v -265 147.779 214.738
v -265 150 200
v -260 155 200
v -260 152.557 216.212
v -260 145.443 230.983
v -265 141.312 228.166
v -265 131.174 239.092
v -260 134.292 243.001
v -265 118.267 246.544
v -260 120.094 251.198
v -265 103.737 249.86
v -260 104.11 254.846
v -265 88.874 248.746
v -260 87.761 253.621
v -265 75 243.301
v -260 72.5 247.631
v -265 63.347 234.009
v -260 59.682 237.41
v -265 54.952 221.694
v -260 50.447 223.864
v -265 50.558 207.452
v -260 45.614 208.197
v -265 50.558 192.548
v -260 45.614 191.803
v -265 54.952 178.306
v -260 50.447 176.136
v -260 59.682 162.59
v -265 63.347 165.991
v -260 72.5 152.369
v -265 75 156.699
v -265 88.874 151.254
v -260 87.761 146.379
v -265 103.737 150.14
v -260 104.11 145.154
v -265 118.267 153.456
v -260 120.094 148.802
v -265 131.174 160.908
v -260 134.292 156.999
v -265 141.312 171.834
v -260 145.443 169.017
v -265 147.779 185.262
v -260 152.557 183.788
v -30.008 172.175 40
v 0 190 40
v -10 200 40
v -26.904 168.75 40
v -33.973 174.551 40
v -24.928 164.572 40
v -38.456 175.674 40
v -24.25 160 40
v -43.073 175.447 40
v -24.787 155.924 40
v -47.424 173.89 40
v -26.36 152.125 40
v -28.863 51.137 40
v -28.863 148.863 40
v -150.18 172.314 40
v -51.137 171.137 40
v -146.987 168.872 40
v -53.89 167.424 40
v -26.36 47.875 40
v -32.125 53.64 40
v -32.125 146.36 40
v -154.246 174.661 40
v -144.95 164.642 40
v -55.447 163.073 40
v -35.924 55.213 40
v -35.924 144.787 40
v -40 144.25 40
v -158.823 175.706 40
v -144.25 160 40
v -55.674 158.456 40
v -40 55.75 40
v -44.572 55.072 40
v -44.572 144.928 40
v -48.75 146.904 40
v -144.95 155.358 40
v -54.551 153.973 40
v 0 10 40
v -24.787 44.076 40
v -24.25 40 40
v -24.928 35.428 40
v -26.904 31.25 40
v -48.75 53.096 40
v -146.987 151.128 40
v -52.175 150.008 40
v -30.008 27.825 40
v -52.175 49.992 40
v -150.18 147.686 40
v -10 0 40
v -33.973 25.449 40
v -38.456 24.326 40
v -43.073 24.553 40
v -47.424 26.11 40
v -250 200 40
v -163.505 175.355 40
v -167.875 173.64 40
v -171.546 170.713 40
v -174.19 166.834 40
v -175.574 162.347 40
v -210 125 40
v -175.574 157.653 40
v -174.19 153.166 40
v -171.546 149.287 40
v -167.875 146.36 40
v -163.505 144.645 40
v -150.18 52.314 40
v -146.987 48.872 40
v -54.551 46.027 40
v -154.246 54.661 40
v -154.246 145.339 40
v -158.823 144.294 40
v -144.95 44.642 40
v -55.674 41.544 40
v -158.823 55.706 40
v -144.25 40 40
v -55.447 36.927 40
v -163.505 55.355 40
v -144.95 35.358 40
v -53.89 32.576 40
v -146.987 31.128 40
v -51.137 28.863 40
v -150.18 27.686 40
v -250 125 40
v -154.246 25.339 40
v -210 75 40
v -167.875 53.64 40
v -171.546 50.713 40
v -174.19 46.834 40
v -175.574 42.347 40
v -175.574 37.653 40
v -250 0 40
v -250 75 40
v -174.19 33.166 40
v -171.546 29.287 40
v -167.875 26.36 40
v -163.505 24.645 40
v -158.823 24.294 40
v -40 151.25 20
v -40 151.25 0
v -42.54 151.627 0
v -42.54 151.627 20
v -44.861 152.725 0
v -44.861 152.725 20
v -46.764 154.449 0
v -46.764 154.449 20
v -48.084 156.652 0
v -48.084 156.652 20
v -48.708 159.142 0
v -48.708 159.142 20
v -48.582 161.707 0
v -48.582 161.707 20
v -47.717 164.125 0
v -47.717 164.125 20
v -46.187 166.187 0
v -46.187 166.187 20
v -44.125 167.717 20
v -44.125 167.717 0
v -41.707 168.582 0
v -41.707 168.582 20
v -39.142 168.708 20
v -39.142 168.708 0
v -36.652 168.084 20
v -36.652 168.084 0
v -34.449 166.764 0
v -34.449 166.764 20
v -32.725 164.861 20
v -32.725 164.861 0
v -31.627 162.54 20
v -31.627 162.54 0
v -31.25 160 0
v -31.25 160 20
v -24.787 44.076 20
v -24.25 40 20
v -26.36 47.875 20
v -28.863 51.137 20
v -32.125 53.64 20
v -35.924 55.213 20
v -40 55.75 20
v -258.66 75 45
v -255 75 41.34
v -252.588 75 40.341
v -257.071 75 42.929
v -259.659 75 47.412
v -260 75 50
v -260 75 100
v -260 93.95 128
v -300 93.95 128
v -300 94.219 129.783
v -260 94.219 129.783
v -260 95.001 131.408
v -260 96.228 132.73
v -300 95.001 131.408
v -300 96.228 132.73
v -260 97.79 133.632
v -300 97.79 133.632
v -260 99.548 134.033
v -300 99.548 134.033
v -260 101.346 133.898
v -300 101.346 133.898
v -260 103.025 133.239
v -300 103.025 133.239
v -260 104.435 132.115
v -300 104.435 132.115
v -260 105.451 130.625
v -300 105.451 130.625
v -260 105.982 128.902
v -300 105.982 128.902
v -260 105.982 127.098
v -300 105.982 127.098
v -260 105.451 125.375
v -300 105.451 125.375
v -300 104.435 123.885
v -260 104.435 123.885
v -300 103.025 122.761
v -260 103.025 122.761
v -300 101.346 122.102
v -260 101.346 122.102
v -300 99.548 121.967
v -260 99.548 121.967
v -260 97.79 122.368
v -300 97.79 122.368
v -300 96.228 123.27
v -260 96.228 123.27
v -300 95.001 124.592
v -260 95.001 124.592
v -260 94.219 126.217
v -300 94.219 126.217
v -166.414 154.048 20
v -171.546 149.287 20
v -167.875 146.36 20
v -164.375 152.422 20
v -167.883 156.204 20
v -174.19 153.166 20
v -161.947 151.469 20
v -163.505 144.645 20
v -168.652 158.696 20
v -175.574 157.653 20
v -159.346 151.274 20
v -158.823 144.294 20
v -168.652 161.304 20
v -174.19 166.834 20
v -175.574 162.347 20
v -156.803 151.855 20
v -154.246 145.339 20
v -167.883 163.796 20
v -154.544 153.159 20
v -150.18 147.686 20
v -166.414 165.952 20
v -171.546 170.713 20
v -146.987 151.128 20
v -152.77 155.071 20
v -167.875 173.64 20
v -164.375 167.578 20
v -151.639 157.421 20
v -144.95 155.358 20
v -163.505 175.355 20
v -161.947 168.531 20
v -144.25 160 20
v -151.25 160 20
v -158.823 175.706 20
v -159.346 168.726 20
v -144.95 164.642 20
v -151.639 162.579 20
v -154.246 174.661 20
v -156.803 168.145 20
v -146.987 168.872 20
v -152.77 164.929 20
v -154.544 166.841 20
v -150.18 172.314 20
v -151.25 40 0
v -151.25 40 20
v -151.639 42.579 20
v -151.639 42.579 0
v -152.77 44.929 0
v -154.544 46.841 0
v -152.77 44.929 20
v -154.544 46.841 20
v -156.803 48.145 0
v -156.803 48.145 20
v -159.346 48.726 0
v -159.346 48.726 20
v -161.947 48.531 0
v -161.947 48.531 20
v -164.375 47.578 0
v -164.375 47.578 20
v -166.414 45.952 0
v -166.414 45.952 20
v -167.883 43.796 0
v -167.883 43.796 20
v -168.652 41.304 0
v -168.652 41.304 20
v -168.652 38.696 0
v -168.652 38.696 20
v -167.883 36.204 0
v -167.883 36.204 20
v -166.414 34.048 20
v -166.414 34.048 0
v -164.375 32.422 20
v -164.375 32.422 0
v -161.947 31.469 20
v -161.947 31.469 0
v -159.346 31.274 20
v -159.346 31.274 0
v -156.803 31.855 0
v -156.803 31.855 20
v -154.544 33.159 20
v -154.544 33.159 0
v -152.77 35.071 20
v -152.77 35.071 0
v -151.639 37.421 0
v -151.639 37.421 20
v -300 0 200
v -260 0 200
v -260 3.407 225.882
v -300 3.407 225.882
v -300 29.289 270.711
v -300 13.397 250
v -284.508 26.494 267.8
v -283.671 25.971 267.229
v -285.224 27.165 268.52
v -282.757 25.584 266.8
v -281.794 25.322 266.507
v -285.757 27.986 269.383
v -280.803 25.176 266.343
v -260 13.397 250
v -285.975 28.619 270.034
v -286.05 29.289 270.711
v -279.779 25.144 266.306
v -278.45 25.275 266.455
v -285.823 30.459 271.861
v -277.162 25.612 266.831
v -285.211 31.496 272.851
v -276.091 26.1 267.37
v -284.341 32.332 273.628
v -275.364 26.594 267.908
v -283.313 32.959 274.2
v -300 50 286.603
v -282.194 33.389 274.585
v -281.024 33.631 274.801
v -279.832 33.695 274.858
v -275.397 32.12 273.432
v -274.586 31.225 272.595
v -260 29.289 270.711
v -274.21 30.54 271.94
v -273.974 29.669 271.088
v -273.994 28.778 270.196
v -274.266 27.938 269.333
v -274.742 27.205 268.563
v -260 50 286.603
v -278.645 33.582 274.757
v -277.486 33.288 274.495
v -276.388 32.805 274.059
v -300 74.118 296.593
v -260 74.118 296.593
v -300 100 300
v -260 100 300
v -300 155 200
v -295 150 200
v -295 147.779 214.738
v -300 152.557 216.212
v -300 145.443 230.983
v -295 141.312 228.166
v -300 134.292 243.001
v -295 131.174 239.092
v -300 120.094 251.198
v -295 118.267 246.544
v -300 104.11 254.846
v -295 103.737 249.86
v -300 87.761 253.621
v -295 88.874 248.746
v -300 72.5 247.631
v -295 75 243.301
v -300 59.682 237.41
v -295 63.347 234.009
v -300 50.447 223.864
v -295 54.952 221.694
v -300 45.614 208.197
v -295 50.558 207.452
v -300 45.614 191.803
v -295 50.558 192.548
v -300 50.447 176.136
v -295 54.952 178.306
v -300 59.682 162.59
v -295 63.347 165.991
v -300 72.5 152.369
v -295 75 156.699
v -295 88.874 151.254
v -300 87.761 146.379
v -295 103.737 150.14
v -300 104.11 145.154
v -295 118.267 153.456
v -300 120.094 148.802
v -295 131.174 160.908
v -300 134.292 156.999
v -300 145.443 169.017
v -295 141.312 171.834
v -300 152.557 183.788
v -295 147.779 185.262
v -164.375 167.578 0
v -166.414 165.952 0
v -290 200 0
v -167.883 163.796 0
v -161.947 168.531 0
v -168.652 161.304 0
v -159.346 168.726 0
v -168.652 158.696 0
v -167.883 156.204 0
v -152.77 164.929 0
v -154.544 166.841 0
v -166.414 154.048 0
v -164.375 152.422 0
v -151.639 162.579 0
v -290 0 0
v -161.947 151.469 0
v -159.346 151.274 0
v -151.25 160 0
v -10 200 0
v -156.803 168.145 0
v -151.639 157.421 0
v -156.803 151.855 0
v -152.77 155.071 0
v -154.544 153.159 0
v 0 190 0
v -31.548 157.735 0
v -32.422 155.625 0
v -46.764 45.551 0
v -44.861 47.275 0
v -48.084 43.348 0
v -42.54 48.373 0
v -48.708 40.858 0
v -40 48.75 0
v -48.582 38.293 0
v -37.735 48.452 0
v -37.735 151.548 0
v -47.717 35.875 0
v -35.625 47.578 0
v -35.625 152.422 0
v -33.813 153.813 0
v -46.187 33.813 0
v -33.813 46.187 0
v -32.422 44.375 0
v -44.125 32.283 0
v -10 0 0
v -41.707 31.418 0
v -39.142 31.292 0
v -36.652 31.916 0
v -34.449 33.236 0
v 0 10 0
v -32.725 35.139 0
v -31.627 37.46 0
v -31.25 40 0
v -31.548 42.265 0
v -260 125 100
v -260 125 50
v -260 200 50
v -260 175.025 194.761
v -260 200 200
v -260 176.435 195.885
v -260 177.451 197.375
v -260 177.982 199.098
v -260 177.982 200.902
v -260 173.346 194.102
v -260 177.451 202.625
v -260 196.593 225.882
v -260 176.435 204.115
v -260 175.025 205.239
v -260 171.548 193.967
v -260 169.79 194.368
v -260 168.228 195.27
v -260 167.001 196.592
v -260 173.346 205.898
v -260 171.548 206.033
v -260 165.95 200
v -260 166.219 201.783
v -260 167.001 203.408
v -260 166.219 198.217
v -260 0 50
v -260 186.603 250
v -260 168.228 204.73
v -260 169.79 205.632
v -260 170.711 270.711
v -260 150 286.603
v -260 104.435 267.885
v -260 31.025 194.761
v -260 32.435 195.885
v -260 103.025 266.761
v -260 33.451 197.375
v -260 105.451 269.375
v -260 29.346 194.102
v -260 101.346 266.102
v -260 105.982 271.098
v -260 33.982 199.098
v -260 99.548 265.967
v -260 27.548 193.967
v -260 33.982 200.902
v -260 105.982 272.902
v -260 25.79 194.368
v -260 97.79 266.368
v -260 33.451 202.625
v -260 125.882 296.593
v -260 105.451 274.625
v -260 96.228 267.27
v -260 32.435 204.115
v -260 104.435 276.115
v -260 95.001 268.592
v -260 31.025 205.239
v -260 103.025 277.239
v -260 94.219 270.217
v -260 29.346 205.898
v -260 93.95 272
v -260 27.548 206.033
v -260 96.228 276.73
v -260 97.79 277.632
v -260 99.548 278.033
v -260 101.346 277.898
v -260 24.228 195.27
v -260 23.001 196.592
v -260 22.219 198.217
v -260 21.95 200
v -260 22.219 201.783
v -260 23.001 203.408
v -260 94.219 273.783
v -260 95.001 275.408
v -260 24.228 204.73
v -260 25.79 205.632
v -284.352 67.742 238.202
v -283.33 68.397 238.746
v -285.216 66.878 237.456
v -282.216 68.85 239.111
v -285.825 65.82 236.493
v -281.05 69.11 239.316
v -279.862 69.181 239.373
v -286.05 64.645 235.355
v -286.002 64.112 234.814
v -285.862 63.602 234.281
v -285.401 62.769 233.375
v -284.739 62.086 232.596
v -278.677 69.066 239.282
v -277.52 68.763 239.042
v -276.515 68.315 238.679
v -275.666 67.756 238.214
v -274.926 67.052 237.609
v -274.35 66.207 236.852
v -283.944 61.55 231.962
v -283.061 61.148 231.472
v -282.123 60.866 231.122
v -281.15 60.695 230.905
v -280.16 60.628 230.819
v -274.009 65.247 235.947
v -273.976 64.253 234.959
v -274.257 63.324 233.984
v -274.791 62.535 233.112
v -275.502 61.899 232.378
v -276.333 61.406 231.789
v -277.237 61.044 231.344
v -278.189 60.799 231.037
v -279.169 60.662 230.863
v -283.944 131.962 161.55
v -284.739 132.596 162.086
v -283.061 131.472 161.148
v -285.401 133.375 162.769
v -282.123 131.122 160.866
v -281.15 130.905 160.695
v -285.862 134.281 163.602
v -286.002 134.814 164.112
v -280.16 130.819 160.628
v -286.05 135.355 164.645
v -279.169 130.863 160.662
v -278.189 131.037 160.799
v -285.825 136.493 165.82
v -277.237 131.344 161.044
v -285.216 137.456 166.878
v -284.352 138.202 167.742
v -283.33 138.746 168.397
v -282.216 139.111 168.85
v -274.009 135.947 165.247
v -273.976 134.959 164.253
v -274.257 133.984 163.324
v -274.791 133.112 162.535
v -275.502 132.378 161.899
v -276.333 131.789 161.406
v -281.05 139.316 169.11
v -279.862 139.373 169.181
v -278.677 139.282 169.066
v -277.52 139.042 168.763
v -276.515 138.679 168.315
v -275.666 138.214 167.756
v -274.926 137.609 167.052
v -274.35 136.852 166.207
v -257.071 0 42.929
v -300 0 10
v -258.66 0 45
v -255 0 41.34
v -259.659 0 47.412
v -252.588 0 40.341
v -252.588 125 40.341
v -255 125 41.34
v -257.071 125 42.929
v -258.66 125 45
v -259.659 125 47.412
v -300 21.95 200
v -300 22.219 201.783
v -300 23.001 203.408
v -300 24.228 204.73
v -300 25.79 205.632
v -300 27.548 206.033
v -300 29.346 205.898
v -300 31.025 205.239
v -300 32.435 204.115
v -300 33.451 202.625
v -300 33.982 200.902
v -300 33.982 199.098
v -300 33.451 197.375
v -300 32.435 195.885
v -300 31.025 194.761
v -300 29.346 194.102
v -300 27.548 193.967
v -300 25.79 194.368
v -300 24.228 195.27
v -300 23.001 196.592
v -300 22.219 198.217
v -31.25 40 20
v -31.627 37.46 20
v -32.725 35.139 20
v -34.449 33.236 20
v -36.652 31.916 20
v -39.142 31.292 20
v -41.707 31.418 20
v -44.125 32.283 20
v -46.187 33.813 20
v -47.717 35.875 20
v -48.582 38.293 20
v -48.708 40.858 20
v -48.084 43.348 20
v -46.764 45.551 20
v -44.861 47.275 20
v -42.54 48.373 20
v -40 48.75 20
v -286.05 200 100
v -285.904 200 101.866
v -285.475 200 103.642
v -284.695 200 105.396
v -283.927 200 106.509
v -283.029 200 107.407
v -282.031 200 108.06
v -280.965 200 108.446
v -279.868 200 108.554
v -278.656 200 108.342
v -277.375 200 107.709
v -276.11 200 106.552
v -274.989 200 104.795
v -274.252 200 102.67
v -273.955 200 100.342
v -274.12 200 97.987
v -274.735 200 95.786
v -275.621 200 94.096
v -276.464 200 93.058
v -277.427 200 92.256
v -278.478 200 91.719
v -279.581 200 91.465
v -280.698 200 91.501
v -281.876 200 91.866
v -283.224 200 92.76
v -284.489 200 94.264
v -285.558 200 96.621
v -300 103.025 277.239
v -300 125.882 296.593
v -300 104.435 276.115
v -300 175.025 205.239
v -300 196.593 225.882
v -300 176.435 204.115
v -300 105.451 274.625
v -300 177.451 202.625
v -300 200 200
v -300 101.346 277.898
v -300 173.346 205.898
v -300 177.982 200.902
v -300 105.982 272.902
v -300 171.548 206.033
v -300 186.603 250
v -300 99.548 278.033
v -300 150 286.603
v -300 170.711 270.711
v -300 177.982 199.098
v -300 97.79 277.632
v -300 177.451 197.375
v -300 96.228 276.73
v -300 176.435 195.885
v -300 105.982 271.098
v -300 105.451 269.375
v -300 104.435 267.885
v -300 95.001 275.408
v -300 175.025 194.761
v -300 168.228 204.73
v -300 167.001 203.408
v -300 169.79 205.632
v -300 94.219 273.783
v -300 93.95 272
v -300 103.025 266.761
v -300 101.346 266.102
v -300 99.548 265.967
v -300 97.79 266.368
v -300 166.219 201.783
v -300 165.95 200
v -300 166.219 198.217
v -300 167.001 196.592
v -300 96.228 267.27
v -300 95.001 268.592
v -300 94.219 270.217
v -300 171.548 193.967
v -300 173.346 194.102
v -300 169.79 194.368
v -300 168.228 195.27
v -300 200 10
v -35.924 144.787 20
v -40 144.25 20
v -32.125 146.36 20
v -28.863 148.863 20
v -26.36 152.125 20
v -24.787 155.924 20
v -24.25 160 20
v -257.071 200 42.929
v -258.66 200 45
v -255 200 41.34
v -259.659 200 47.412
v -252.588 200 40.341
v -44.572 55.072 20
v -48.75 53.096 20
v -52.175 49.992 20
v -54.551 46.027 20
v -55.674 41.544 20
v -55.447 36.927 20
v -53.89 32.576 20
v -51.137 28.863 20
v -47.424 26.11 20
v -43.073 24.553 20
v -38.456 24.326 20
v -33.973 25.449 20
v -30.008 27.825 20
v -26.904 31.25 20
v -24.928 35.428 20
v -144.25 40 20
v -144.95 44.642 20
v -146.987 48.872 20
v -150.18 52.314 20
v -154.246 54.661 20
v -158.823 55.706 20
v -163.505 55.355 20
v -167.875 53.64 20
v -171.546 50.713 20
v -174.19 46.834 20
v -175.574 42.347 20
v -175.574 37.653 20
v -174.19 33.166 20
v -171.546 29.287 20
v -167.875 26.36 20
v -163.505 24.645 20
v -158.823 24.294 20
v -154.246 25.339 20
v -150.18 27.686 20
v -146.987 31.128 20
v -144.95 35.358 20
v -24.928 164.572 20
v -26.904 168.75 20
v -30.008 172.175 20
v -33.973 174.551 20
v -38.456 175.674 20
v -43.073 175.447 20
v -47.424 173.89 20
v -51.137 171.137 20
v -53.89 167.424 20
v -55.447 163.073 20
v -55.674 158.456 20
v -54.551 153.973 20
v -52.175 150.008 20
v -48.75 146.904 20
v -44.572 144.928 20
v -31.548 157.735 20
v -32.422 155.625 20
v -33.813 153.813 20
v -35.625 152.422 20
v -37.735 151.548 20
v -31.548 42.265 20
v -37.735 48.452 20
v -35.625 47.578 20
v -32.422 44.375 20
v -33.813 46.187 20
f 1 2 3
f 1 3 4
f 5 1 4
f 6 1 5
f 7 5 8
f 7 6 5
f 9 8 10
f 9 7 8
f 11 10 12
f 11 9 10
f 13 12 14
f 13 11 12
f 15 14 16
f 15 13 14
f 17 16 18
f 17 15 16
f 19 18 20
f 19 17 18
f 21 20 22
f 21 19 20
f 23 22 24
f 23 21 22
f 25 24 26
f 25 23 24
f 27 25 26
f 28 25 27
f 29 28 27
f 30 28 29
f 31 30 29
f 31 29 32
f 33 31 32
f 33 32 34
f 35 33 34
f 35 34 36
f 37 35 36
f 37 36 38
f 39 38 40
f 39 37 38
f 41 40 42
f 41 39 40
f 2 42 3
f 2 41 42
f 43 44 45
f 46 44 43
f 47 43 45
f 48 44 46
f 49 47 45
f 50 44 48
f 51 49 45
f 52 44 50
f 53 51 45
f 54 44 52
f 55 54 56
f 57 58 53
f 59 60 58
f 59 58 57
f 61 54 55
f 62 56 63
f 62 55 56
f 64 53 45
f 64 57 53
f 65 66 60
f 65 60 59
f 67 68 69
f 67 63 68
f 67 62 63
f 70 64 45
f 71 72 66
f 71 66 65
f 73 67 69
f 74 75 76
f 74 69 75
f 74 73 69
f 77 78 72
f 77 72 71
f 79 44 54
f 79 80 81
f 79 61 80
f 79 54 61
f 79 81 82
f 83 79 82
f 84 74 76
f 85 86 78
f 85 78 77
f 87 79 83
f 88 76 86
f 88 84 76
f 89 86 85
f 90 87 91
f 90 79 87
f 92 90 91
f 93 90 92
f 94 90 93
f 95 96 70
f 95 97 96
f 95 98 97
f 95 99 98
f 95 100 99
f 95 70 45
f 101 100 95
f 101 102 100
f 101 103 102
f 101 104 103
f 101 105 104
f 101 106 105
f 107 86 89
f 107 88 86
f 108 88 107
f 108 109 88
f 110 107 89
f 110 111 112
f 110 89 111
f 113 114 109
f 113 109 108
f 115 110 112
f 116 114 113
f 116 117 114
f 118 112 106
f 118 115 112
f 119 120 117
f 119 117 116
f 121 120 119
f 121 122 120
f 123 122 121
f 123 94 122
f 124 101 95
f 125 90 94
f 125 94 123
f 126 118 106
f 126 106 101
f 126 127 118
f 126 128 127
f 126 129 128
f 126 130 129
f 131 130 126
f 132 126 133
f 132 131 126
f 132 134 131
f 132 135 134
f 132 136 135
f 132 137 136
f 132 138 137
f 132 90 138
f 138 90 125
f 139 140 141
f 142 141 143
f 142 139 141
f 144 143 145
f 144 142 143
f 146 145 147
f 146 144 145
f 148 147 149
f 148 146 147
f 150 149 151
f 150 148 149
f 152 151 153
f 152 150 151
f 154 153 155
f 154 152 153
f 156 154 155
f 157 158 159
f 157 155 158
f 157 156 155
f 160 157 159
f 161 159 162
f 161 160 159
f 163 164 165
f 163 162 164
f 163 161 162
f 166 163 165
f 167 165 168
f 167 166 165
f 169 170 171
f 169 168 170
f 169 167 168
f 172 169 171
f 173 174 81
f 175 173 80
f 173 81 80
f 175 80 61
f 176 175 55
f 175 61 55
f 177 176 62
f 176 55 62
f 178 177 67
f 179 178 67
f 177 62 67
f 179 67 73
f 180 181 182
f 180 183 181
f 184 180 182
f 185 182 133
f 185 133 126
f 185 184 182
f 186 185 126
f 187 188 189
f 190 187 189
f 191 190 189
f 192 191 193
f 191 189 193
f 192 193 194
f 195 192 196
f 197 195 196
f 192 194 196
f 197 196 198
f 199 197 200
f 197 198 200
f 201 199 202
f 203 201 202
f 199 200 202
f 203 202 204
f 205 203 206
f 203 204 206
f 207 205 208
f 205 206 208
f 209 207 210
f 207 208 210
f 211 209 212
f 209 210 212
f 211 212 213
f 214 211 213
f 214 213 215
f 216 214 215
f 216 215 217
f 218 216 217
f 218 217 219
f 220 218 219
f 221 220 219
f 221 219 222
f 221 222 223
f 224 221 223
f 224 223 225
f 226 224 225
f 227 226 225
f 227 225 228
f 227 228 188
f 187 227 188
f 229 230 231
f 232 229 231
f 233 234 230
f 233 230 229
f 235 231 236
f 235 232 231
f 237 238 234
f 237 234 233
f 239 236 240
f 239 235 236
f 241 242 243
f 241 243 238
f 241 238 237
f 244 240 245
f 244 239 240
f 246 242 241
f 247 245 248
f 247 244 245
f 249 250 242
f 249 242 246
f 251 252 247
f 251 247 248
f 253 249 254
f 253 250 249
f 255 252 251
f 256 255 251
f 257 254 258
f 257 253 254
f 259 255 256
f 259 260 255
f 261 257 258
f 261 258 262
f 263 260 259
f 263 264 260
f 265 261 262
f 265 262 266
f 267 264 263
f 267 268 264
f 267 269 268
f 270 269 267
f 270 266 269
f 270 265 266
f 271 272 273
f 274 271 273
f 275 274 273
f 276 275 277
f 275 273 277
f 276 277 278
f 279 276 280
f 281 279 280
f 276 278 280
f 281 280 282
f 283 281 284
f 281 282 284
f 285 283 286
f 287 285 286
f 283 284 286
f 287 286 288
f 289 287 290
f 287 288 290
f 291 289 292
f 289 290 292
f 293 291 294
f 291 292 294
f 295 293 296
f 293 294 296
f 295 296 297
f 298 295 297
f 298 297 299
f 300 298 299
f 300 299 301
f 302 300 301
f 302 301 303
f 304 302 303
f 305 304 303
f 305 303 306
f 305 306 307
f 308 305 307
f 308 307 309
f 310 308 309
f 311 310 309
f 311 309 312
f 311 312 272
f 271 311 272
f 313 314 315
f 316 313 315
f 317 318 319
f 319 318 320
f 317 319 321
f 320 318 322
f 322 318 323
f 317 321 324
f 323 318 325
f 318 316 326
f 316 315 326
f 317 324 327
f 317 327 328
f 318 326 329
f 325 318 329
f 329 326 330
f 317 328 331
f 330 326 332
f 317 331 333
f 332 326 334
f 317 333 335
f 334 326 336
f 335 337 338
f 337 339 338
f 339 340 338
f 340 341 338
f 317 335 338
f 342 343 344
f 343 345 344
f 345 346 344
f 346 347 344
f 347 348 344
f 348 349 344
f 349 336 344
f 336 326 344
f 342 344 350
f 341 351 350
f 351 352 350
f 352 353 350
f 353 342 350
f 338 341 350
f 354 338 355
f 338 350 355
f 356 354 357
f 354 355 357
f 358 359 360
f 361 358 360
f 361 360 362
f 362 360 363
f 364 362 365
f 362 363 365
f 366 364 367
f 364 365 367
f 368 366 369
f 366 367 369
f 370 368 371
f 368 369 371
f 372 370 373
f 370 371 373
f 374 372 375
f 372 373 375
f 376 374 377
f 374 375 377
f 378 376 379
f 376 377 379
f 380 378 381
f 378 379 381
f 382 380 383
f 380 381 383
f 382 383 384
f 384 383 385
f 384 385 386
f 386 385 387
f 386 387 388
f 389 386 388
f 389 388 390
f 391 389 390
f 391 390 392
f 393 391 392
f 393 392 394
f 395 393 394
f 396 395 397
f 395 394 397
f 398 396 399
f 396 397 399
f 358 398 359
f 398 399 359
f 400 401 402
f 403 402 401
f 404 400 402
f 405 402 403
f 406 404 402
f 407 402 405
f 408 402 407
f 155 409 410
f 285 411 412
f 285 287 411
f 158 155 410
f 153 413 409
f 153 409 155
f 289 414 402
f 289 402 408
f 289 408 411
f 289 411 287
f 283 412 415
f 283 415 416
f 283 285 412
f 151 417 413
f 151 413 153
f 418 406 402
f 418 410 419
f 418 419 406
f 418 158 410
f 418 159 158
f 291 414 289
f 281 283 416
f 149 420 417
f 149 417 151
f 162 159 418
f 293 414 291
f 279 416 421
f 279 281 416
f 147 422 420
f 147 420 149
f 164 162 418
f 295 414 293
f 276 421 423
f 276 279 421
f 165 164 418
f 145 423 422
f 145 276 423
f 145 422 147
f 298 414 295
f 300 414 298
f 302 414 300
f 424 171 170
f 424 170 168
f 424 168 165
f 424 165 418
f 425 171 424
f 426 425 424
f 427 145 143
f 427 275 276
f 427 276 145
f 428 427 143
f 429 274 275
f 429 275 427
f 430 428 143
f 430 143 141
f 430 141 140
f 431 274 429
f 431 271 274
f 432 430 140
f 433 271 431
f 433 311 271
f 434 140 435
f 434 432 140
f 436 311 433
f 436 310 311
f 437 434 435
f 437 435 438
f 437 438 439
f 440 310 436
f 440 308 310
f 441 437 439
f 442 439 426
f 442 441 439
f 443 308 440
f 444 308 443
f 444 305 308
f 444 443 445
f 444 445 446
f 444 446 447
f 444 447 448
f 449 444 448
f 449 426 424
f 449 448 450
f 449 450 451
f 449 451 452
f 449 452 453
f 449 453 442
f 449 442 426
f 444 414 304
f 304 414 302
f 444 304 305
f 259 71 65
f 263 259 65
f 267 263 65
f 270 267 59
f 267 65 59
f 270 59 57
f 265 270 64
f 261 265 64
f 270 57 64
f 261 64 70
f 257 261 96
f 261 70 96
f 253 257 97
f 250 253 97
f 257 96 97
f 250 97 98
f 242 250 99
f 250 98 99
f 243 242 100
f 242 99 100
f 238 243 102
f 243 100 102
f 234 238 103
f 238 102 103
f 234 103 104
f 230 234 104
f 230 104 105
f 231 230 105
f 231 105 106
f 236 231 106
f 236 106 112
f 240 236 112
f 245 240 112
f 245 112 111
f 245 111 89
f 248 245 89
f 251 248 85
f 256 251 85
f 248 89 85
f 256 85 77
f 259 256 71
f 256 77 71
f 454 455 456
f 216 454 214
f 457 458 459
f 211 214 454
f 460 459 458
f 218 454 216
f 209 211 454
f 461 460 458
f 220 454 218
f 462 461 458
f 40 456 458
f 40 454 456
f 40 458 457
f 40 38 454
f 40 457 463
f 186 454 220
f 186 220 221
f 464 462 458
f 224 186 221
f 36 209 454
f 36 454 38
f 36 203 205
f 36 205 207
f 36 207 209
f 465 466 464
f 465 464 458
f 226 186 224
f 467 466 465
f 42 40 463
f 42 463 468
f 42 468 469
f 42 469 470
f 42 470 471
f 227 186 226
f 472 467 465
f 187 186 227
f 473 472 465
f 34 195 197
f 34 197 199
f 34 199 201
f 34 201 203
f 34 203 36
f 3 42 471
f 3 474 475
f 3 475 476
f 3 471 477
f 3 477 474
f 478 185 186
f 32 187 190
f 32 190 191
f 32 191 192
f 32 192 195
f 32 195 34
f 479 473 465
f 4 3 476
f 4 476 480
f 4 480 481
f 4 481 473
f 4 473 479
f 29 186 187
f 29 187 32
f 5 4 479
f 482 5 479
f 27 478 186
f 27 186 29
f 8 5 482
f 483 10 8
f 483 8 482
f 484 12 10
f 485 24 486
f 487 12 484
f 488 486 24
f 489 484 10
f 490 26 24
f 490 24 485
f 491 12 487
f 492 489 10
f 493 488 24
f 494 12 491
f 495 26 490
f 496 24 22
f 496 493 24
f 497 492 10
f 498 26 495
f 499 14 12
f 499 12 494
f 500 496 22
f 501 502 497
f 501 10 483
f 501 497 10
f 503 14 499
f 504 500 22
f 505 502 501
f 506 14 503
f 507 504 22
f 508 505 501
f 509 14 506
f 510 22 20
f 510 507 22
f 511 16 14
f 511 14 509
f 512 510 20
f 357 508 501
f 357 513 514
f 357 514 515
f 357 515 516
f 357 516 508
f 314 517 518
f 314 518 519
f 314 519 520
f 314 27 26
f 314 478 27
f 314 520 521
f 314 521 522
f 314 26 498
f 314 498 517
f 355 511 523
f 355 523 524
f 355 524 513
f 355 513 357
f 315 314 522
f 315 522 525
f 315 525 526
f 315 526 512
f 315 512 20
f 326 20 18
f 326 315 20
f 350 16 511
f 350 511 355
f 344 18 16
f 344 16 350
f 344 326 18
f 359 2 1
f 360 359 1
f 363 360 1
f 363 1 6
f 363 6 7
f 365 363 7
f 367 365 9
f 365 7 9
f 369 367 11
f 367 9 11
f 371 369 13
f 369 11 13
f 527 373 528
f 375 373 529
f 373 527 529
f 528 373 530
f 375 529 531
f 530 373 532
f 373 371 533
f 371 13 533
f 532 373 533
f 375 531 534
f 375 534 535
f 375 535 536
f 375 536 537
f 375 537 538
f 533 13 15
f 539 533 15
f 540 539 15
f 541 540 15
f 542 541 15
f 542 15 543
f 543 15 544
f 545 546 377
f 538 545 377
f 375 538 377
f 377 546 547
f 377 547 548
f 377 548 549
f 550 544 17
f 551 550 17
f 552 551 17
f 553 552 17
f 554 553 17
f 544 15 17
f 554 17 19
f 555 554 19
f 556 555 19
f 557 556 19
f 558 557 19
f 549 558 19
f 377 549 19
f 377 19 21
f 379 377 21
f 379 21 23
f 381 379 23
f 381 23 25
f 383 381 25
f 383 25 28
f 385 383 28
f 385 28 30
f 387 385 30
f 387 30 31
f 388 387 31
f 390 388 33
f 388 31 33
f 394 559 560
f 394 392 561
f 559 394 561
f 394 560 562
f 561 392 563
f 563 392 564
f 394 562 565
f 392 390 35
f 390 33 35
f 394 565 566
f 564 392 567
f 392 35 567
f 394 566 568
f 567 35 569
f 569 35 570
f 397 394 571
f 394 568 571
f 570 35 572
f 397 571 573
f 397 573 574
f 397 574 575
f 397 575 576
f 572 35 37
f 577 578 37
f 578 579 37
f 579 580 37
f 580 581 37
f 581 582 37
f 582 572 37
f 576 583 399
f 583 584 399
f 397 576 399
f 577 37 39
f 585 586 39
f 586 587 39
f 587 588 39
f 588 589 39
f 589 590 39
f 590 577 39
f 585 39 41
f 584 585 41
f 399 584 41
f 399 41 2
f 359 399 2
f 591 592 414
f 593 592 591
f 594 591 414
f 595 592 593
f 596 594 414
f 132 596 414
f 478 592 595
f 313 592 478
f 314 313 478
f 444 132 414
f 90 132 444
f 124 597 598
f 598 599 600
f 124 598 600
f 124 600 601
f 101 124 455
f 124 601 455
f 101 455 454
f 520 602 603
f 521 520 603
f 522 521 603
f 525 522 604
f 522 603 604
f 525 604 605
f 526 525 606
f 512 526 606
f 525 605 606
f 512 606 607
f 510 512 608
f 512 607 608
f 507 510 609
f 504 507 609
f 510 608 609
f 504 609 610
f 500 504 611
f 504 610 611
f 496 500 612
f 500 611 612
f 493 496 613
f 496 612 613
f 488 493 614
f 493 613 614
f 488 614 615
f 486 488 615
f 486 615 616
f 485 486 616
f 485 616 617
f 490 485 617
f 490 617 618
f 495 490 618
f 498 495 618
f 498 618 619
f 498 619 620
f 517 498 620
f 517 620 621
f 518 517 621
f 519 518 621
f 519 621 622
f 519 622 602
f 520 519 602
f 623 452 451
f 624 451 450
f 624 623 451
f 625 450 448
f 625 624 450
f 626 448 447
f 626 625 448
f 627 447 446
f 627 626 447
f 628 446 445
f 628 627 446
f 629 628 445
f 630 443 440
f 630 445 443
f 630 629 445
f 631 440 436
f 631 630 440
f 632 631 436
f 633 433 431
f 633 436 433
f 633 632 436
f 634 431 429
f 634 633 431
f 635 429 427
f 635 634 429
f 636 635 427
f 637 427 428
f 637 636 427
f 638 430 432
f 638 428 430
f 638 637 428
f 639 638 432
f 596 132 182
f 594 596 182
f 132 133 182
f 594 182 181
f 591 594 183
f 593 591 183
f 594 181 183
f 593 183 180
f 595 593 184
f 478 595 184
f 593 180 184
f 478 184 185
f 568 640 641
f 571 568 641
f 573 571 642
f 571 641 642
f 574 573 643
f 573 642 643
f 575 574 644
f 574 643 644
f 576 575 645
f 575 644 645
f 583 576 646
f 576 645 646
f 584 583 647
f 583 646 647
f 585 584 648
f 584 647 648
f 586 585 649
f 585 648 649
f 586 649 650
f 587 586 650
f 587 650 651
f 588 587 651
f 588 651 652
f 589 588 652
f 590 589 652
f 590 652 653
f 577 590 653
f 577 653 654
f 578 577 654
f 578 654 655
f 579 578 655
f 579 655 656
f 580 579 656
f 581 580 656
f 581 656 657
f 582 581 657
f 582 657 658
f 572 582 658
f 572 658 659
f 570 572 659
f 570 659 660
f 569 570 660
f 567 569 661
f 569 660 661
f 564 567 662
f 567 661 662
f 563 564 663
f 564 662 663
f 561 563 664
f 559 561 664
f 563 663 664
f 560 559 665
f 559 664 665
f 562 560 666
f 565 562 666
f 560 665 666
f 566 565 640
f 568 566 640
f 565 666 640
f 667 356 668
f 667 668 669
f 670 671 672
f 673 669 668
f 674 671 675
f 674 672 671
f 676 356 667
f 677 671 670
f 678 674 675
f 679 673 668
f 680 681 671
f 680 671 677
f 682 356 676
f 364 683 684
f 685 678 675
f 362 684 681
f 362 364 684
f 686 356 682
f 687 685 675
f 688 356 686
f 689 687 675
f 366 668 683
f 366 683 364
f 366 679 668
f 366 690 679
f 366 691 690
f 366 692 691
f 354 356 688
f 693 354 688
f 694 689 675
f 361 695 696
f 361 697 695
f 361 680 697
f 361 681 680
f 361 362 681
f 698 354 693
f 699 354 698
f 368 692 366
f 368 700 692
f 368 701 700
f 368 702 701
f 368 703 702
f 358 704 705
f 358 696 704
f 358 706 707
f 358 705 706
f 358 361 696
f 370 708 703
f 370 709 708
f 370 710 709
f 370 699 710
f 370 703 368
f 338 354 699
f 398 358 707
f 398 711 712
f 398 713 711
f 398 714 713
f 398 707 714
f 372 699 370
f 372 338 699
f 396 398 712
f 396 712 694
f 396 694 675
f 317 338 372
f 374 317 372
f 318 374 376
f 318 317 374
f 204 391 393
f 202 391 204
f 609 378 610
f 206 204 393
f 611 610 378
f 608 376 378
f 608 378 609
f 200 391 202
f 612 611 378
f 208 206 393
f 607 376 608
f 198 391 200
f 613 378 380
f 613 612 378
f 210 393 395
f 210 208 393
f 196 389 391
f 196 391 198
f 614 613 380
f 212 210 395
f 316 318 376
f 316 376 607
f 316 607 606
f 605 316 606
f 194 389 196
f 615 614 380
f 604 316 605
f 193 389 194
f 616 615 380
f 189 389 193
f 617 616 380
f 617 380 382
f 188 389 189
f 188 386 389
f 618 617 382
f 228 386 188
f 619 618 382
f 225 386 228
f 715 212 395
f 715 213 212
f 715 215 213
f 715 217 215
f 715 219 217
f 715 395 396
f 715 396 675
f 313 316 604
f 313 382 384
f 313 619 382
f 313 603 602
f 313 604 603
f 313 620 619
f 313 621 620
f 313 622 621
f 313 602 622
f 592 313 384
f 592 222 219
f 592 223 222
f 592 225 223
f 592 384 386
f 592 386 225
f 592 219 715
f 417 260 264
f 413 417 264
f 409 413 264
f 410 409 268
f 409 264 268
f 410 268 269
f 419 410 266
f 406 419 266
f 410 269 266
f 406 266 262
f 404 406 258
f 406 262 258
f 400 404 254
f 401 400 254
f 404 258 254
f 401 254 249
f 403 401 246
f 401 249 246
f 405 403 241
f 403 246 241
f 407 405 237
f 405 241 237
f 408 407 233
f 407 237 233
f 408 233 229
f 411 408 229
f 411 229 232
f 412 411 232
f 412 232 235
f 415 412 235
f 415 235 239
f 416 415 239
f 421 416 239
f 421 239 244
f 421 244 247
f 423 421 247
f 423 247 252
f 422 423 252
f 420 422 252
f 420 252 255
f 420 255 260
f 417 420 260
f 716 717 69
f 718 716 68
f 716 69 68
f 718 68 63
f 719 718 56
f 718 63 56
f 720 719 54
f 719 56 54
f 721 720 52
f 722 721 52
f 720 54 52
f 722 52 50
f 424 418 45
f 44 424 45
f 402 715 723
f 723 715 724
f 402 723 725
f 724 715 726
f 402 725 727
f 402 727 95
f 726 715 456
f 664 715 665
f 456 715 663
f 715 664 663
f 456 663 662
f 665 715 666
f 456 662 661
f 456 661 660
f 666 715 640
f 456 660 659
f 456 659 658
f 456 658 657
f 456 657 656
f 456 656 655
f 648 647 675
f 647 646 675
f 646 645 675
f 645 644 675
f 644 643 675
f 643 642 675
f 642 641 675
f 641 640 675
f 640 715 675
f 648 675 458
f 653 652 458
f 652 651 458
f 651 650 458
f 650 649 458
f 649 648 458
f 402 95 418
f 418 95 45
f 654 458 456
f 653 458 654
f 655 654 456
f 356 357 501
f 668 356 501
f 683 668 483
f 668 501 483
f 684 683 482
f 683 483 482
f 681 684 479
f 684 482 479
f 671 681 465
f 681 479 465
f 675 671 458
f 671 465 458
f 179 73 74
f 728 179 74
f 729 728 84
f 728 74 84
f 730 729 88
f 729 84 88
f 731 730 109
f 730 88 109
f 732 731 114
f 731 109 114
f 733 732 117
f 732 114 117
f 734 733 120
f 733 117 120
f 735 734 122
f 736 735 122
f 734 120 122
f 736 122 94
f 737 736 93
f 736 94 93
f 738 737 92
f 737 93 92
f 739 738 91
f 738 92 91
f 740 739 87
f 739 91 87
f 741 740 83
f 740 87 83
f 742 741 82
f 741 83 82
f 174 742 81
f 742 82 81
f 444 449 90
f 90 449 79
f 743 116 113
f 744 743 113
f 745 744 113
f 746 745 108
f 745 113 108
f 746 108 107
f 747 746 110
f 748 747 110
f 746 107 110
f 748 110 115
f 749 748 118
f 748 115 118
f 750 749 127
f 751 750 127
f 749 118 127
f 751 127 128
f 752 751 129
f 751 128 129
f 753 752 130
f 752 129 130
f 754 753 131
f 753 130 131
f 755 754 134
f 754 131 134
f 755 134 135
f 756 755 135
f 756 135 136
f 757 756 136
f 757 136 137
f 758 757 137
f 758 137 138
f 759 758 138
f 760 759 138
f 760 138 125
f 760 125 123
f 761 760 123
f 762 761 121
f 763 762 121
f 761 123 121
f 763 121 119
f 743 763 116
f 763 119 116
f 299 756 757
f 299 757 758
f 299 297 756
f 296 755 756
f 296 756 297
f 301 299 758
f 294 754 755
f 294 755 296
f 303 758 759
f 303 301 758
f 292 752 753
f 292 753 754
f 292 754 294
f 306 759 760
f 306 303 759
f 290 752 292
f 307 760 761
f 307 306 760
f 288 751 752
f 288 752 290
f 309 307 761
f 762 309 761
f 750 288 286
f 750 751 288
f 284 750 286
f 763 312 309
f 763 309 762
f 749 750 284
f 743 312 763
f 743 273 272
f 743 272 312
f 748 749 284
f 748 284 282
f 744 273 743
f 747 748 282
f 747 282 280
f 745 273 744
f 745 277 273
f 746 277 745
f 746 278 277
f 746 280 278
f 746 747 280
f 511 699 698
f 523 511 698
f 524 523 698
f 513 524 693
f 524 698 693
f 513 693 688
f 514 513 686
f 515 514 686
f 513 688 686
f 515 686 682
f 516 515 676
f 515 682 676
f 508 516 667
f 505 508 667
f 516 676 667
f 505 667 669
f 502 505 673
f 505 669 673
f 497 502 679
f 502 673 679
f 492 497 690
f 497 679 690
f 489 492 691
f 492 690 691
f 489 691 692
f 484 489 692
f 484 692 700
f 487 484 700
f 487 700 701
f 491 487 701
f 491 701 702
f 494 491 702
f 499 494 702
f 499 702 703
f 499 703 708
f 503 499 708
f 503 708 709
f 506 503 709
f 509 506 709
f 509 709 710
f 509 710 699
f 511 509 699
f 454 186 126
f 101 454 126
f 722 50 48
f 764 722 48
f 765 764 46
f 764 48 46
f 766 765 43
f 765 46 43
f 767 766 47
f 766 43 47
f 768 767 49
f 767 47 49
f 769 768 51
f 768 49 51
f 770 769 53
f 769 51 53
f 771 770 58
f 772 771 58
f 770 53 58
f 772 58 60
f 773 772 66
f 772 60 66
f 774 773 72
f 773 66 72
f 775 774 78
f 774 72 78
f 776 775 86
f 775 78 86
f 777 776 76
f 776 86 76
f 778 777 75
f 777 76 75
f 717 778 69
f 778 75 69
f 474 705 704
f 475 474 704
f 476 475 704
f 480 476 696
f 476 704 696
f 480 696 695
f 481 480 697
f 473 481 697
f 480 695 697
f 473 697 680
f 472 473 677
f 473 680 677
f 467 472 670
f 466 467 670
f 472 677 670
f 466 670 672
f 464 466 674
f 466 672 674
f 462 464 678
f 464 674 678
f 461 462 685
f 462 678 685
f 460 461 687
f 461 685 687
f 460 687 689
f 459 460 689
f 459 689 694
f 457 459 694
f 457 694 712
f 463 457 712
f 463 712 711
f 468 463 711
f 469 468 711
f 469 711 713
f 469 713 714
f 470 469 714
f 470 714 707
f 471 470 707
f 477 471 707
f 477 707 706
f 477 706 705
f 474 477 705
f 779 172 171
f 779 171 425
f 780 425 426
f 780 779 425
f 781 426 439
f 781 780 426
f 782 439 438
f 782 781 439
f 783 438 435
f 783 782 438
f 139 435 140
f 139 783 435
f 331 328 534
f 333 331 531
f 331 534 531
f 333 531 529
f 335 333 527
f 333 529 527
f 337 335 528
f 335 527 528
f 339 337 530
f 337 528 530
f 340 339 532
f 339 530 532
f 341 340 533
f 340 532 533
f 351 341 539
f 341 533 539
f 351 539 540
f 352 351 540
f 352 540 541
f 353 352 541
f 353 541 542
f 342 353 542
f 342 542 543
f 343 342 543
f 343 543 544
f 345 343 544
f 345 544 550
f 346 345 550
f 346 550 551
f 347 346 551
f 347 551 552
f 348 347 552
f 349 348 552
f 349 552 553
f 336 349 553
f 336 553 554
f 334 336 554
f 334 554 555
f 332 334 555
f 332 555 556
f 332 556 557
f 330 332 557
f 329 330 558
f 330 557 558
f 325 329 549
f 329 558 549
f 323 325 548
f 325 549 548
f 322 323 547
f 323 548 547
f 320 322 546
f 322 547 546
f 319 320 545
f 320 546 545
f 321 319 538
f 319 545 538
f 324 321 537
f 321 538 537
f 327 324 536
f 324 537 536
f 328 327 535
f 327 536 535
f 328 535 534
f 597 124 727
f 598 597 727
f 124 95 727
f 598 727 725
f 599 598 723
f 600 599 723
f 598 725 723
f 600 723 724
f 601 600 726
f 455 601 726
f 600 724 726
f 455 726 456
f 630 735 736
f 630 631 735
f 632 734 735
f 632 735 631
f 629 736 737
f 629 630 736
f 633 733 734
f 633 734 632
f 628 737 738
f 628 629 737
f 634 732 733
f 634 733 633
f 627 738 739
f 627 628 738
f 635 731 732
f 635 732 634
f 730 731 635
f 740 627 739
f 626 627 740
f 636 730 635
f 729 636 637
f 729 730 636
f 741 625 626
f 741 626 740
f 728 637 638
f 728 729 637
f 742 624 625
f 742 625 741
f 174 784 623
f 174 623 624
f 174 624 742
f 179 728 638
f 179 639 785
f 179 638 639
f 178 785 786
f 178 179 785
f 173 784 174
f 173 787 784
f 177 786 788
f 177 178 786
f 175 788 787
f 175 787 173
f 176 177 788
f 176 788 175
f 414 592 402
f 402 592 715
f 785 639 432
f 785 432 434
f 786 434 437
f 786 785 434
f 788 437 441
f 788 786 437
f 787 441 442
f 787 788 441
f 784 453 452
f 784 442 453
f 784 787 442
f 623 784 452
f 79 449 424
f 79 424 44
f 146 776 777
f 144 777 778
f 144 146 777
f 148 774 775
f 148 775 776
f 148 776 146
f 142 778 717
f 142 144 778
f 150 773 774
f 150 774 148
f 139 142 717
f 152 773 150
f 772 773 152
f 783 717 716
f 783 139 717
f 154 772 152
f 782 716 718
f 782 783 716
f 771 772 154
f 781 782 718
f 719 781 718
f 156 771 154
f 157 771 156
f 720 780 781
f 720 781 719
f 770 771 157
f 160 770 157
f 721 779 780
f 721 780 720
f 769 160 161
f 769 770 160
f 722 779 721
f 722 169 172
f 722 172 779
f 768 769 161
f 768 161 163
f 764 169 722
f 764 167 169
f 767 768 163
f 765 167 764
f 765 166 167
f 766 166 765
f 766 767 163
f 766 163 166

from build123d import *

# Parameters (mm, degrees)
F1_DEPTH  = 200
F2_R      = 15.75
F2_R_2    = 8.75
F3_DEPTH  = 20
F4_DEPTH  = 40.001
F6_DEPTH  = 89
F5_R      = 50
F7_DEPTH  = 221
F8_D      = 12.1
F9_W      = 50
F9_H      = 60
F10_DEPTH = 50
F12_DEPTH = 125.001
F13_R     = 10
F14_SIZE  = 10
F15_SIZE  = 5
F16_SIZE  = 10
F20_D     = 12.1


with BuildPart() as f1:
    # F0 (on Front) → F1 (new body)
    with BuildSketch(Plane.XZ):
        Polygon((-300, 0), (0, 0), (0, 40), (-260, 40), (-260, 300), (-300, 300), align=None)
    extrude(amount=-F1_DEPTH)

    # F2 (on face) → F3 (cut)
    with BuildSketch(Plane.XY.offset(40)):
        with Locations((-160, 160)):
            Circle(F2_R)
        with Locations((-160, 160)):
            Circle(F2_R_2, mode=Mode.SUBTRACT)
        with Locations((-160, 40)):
            Circle(F2_R)
        with Locations((-160, 40)):
            Circle(F2_R_2, mode=Mode.SUBTRACT)
        with BuildLine():
            ThreePointArc((-24.25, 40), (-28.8630681963, 51.1369318037), (-40, 55.75))
            ThreePointArc((-40, 55.75), (-51.1369318037, 28.8630681963), (-24.25, 40))
        make_face()
        with BuildLine():
            ThreePointArc((-31.25, 40), (-46.1871843354, 33.8128156646), (-40, 48.75))
            ThreePointArc((-40, 48.75), (-33.8128156646, 46.1871843354), (-31.25, 40))
        make_face(mode=Mode.SUBTRACT)
        with BuildLine():
            ThreePointArc((-24.25, 160), (-51.1369318037, 171.1369318037), (-40, 144.25))
            ThreePointArc((-40, 144.25), (-28.8630681963, 148.8630681963), (-24.25, 160))
        make_face()
        with BuildLine():
            ThreePointArc((-31.25, 160), (-33.8128156646, 153.8128156646), (-40, 151.25))
            ThreePointArc((-40, 151.25), (-46.1871843354, 166.1871843354), (-31.25, 160))
        make_face(mode=Mode.SUBTRACT)
    extrude(amount=-F3_DEPTH, mode=Mode.SUBTRACT)

    # F4 (cut, through all): faces of the model
    f4_faces = [f1.faces().sort_by_distance(p)[0] for p in [
        (-160, 160, 40),
        (-40, 160, 40),
        (-40, 40, 40),
        (-160, 40, 40),
    ]]
    extrude(f4_faces, amount=-F4_DEPTH, mode=Mode.SUBTRACT)

    # F5 (on face) → F6 (cut)
    with BuildSketch(Plane.YZ.offset(-260)):
        with BuildLine():
            ThreePointArc((0, 200), (29.2893218813, 270.7106781187), (100, 300))
            Line((100, 300), (0, 300))
            Line((0, 300), (0, 200))
        make_face()
        with BuildLine():
            ThreePointArc((100, 300), (170.7106781187, 270.7106781187), (200, 200))
            Line((200, 200), (200, 300))
            Line((200, 300), (100, 300))
        make_face()
    extrude(amount=-F6_DEPTH, mode=Mode.SUBTRACT)

    # F5 (on face) → F7 (cut)
    with BuildSketch(Plane.YZ.offset(-260)):
        with Locations((100, 200)):
            Circle(F5_R)
    extrude(amount=-F7_DEPTH, mode=Mode.SUBTRACT)

    # F8 (through all)
    with Locations(Plane.YZ.offset(-260)):
        with Locations((28, 200), (100, 272), (172, 200), (100, 128)):
            Hole(F8_D / 2)

    # F9 (on face) → F10 (join)
    with BuildSketch(Plane.YZ.offset(-260)):
        with Locations((100, 70)):
            Rectangle(F9_W, F9_H)
    extrude(amount=F10_DEPTH)

    # F11 (on face) → F12 (cut, through all)
    with BuildSketch(Plane.XZ.offset(-75)):
        Polygon((-210, 100), (-260, 100), (-210, 40), align=None)
    extrude(amount=-F12_DEPTH, mode=Mode.SUBTRACT)

    # F13
    f13_edges = [f1.edges().sort_by_distance(p)[0] for p in [
        (-260, 37.5, 40),
        (-260, 162.5, 40),
    ]]
    fillet(f13_edges, radius=F13_R)

    # F14
    f14_edges = [f1.edges().sort_by_distance(p)[0] for p in [
        (0, 0, 20),
        (0, 200, 20),
    ]]
    chamfer(f14_edges, length=F14_SIZE)

    # F15
    f15_edges = [f1.edges().sort_by_distance(p)[0] for p in [
        (-260, 50, 200),
        (-300, 50, 200),
    ]]
    chamfer(f15_edges, length=F15_SIZE)

    # F16
    f16_edges = [f1.edges().sort_by_distance(p)[0] for p in [
        (-300, 100, 0),
    ]]
    chamfer(f16_edges, length=F16_SIZE)

    # F20 (through all)
    with Locations(Plane(origin=(0, -120.7106781187, 120.7106781187), x_dir=(1, 0, 0), z_dir=(0, -0.7071067812, 0.7071067812))):
        with Locations((-280, 212.132034356)):
            Hole(F20_D / 2)


solid = f1.part
